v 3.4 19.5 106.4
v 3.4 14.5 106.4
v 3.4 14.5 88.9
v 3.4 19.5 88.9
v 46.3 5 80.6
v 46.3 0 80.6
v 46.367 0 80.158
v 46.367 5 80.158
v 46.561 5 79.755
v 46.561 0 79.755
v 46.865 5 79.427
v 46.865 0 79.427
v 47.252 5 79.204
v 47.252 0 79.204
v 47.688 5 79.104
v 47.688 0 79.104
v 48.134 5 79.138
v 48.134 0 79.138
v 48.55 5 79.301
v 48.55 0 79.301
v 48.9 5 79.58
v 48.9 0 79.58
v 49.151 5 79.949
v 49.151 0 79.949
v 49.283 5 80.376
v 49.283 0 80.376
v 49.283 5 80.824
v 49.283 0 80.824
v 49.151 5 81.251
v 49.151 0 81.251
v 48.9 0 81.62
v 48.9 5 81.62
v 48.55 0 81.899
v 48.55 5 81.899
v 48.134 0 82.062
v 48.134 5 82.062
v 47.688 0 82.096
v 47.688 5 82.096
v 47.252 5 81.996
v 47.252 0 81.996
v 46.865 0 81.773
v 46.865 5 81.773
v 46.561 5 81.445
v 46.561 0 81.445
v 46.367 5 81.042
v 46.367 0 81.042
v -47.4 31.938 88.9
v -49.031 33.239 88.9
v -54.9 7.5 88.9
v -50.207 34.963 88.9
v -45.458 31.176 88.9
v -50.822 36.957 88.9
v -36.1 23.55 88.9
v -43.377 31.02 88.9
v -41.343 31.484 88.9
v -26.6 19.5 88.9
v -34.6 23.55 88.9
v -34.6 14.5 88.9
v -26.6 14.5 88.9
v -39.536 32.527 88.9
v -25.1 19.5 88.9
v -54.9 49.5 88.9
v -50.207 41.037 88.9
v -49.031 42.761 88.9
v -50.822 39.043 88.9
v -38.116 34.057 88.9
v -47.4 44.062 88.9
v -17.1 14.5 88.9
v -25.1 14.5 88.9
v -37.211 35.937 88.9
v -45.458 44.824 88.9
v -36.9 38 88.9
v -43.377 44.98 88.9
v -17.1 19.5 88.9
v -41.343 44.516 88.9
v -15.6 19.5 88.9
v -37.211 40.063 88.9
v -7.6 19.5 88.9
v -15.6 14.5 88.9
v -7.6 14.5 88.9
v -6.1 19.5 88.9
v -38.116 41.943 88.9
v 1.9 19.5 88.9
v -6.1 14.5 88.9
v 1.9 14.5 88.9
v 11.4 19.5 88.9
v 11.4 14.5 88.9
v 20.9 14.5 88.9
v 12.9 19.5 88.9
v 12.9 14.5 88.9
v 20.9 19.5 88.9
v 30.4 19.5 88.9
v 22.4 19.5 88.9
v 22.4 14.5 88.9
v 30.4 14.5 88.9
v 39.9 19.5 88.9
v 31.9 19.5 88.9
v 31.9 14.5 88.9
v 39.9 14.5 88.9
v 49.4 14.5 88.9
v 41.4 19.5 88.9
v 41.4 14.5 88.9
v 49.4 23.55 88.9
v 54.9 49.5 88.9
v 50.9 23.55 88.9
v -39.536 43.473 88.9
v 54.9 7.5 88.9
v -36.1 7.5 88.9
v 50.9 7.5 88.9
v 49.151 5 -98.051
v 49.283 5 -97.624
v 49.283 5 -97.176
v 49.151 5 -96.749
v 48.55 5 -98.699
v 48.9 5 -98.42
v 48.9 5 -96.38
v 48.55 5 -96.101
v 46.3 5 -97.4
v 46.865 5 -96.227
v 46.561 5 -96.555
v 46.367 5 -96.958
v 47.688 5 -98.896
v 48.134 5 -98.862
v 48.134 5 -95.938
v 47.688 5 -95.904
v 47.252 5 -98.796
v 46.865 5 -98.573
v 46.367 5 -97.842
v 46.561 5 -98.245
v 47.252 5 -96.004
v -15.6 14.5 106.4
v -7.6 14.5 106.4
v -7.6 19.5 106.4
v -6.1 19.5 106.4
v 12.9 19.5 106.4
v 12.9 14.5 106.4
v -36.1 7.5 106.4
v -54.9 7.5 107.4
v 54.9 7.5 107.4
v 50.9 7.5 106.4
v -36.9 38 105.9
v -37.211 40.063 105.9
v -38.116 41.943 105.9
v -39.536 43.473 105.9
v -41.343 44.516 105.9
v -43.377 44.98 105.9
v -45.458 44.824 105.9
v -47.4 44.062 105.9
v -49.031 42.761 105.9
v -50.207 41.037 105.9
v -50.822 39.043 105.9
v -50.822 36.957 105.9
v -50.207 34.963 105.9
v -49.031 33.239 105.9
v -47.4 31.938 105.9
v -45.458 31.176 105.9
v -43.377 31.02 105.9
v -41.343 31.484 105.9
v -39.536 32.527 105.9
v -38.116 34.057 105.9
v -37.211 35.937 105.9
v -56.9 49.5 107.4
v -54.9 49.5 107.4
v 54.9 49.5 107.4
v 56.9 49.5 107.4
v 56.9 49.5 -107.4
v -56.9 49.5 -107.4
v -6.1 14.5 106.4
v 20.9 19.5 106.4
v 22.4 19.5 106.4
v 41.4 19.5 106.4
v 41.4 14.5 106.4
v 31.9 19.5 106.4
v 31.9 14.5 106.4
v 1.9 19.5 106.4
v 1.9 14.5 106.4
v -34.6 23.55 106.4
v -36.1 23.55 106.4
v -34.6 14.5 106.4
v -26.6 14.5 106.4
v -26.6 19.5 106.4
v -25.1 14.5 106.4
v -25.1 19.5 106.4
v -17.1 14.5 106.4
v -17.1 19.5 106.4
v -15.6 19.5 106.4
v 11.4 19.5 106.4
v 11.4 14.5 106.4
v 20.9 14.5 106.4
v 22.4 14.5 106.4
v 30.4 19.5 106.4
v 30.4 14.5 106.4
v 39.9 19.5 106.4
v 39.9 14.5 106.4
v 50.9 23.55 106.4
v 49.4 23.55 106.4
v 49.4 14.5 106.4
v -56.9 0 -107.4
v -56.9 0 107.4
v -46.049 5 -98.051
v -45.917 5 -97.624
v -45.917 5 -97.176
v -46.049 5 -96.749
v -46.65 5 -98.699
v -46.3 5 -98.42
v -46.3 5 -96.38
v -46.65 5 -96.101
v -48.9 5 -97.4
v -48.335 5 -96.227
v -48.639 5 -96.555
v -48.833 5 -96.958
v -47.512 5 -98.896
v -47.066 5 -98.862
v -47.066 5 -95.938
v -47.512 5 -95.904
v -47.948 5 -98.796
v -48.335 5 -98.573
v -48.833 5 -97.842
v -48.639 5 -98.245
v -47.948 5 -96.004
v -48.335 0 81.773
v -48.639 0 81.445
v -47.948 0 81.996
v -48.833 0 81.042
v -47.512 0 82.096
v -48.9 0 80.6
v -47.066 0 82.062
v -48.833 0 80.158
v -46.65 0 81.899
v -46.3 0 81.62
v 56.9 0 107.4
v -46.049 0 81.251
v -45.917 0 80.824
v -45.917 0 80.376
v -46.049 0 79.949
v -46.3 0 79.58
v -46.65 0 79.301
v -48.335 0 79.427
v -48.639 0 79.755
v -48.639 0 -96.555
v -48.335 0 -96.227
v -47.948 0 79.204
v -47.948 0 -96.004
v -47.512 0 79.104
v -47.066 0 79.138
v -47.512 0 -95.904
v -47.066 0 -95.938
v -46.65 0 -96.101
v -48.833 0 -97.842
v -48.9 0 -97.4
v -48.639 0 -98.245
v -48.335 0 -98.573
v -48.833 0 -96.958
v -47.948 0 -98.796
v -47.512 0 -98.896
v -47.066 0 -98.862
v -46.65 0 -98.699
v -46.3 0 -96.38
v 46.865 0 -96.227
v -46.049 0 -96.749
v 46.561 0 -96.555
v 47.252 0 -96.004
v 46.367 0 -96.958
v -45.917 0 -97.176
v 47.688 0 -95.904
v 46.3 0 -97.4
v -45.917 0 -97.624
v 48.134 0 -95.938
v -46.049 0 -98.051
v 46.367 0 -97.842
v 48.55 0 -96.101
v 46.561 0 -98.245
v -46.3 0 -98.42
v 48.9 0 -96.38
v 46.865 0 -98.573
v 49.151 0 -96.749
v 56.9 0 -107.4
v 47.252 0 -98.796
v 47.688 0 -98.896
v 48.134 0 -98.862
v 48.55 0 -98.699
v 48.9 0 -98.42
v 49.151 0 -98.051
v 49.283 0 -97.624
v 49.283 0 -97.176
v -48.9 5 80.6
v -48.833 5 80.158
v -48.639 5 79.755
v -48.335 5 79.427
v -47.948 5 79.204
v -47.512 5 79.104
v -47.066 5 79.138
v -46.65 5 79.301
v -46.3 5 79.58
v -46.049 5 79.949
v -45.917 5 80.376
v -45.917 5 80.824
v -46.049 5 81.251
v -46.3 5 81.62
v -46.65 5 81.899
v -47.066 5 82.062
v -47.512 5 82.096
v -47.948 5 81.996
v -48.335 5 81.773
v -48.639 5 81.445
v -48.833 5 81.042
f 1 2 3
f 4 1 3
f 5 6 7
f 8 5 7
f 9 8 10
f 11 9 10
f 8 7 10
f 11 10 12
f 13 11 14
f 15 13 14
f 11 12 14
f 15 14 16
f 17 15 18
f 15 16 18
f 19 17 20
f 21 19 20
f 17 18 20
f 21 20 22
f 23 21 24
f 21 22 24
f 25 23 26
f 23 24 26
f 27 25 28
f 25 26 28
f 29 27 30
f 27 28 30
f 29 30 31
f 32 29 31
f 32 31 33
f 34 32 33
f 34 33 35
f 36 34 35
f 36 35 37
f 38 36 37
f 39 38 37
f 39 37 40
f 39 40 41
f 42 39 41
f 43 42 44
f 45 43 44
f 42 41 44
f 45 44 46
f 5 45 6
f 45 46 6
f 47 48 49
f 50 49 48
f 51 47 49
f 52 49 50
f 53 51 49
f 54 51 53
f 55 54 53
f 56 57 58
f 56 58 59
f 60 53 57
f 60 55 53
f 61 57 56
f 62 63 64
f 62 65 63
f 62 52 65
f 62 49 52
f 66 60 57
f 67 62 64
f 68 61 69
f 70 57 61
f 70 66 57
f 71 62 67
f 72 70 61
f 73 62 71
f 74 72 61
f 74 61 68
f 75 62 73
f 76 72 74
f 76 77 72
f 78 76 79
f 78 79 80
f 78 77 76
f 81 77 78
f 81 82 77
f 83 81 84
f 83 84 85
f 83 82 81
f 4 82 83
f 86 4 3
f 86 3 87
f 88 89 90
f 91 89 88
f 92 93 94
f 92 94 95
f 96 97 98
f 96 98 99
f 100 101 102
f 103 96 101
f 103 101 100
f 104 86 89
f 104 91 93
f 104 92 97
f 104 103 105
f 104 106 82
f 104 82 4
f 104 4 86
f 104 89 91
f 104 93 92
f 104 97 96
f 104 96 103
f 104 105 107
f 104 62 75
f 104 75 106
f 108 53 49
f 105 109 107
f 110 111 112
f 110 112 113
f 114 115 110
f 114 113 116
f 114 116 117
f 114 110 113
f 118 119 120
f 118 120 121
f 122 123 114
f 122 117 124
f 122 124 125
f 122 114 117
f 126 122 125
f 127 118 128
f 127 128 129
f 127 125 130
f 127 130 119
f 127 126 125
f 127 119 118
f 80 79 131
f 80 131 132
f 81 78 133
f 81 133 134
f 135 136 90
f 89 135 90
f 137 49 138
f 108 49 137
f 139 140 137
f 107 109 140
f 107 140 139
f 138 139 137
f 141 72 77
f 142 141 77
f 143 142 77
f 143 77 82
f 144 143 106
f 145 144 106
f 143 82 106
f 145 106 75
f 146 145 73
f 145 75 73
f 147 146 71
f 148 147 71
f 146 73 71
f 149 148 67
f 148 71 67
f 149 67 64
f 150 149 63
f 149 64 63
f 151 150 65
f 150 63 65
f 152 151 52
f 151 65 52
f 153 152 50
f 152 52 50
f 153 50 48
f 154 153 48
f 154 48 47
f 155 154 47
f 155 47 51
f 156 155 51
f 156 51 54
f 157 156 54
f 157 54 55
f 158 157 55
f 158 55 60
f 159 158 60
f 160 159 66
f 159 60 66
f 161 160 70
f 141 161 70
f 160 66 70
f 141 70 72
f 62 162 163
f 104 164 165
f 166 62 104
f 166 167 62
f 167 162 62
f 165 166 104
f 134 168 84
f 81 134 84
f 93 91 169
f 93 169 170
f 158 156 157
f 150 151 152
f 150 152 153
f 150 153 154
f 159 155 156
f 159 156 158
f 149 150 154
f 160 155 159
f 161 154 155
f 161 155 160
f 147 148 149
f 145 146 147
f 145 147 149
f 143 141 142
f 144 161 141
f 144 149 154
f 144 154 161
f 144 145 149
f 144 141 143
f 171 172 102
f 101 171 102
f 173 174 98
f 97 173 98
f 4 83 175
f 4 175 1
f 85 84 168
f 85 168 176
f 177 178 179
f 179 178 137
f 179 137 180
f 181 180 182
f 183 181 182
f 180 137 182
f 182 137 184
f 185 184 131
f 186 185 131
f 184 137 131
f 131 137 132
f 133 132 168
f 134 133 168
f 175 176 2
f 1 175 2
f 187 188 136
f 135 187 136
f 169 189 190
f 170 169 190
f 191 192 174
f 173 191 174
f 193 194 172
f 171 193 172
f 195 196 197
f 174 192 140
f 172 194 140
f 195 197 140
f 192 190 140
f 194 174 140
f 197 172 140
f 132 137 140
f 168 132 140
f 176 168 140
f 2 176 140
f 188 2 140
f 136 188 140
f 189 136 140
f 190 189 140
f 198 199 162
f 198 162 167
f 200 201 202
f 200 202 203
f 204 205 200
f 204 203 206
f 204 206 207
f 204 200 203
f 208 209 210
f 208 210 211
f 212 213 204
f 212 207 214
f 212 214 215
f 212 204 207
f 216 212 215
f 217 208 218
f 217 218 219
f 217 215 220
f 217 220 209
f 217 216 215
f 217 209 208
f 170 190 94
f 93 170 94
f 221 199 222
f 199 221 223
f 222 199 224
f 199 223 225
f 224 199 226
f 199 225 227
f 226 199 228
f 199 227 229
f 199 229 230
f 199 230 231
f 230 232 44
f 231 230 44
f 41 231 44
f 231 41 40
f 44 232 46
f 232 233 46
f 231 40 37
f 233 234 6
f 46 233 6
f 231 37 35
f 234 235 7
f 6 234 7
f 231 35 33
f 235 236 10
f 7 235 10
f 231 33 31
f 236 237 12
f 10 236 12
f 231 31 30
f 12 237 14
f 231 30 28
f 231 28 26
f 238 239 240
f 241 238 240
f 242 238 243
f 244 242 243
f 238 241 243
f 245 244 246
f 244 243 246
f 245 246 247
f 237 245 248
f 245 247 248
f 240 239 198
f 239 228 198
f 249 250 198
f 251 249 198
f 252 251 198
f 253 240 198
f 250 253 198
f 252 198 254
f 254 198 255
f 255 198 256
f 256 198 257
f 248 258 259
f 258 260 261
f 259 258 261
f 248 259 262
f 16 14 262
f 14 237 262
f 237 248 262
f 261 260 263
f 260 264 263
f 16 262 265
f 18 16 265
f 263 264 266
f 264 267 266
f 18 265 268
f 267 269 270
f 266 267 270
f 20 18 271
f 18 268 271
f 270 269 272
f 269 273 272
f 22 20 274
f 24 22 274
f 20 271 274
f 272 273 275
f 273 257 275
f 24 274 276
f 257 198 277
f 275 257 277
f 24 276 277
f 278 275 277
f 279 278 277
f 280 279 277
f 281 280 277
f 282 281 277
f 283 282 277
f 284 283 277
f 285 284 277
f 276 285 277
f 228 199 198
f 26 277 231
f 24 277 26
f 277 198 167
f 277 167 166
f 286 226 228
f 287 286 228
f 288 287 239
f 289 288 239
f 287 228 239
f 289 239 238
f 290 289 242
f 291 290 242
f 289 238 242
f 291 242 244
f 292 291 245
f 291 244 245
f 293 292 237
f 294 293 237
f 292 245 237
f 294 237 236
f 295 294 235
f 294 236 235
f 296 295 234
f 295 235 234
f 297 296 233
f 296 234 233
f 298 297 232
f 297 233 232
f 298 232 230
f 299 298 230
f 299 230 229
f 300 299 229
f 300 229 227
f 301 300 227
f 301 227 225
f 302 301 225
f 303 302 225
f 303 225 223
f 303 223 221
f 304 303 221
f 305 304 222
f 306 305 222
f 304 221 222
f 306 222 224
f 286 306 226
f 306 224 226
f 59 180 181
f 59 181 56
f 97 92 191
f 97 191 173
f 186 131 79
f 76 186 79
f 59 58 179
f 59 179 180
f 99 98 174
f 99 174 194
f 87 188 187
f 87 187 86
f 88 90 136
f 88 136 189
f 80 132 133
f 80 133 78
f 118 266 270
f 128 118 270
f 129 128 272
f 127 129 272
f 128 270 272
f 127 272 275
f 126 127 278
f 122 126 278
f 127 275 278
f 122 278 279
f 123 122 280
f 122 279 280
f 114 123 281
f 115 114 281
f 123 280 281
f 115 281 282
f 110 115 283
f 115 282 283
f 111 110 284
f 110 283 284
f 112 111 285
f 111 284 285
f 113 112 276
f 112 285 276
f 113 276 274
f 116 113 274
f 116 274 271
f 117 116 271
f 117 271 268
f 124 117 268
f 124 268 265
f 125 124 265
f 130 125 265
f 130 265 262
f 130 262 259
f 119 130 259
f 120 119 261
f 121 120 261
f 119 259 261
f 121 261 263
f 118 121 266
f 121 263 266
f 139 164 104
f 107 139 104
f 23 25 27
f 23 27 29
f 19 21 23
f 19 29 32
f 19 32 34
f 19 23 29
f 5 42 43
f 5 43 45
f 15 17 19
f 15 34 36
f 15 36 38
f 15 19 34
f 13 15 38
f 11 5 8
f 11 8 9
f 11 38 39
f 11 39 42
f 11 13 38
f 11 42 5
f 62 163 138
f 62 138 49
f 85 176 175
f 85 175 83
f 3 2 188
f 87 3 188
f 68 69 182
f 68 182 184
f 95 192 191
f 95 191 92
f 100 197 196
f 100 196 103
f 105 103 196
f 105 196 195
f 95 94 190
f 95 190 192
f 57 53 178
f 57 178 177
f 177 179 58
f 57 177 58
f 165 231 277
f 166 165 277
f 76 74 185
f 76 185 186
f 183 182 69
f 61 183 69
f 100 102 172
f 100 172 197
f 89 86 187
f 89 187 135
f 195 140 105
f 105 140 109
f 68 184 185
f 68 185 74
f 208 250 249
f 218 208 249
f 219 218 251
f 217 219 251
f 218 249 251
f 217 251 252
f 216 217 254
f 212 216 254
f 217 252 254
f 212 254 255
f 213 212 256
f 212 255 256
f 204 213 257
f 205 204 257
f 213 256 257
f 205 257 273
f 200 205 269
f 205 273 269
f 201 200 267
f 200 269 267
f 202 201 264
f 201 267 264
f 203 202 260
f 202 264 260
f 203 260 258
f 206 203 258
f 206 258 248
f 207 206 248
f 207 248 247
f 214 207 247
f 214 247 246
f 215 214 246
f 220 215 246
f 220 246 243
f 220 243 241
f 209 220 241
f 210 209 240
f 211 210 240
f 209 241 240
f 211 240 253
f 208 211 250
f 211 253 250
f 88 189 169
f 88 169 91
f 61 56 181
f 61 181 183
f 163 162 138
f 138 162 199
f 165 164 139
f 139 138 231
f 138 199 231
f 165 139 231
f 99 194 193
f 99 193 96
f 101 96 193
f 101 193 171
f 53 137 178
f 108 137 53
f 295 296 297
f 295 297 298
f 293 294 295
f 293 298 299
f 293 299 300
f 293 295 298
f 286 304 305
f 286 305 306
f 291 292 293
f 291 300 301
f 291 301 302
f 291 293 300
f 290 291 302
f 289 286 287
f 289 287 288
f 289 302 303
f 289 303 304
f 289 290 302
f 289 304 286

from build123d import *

# Parameters (mm, degrees)
SKETCH1_W           = 113.8
SKETCH1_H           = 214.8
BOSS_EXTRUDE1_DEPTH = 49.5
SKETCH2_W           = 109.8
SKETCH2_H           = 18.5
CUT_EXTRUDE1_DEPTH  = 42
SKETCH3_W           = 87
SKETCH3_H           = 17.5
BOSS_EXTRUDE2_DEPTH = 7
SKETCH4_W           = 1.5
SKETCH4_H           = 17.5
BOSS_EXTRUDE3_DEPTH = 9.05
SKETCH4_3_W         = 1.5
SKETCH4_3_H         = 17.5
BOSS_EXTRUDE4_DEPTH = 5
SKETCH5_R           = 7
BOSS_EXTRUDE5_DEPTH = 17
SKETCH6_R           = 1.5
CUT_EXTRUDE2_DEPTH  = 5


with BuildPart() as part:
    # Sketch1 → Boss-Extrude1 (new body)
    with BuildSketch(Plane(origin=(0, 0, 0), x_dir=(1, 0, 0), z_dir=(0, 1, 0))):
        Rectangle(SKETCH1_W, SKETCH1_H)
    extrude(amount=BOSS_EXTRUDE1_DEPTH)

    # Sketch2 → Cut-Extrude1 (cut)
    with BuildSketch(Plane(origin=(0, 49.5, 0), x_dir=(1, 0, 0), z_dir=(0, 1, 0))):
        with Locations((0, -98.15)):
            Rectangle(SKETCH2_W, SKETCH2_H)
    extrude(amount=-CUT_EXTRUDE1_DEPTH, mode=Mode.SUBTRACT)

    # Sketch3 → Boss-Extrude2 (add)
    with BuildSketch(Plane(origin=(0, 7.5, 0), x_dir=(1, 0, 0), z_dir=(0, 1, 0))):
        with Locations((7.4, -97.65)):
            Rectangle(SKETCH3_W, SKETCH3_H)
    extrude(amount=BOSS_EXTRUDE2_DEPTH)

    # Sketch4 → Boss-Extrude3 (add)
    with BuildSketch(Plane(origin=(0, 14.5, 0), x_dir=(1, 0, 0), z_dir=(0, 1, 0))):
        with Locations((-35.35, -97.65)):
            Rectangle(SKETCH4_W, SKETCH4_H)
        with Locations((50.15, -97.65)):
            Rectangle(SKETCH4_W, SKETCH4_H)
    extrude(amount=BOSS_EXTRUDE3_DEPTH)

    # Sketch4<3> → Boss-Extrude4 (add)
    with BuildSketch(Plane(origin=(0, 14.5, 0), x_dir=(1, 0, 0), z_dir=(0, 1, 0))):
        with Locations((-25.85, -97.65)):
            Rectangle(SKETCH4_3_W, SKETCH4_3_H)
        with Locations((-16.35, -97.65)):
            Rectangle(SKETCH4_3_W, SKETCH4_3_H)
        with Locations((-6.85, -97.65)):
            Rectangle(SKETCH4_3_W, SKETCH4_3_H)
        with Locations((2.65, -97.65)):
            Rectangle(SKETCH4_3_W, SKETCH4_3_H)
        with Locations((12.15, -97.65)):
            Rectangle(SKETCH4_3_W, SKETCH4_3_H)
        with Locations((21.65, -97.65)):
            Rectangle(SKETCH4_3_W, SKETCH4_3_H)
        with Locations((31.15, -97.65)):
            Rectangle(SKETCH4_3_W, SKETCH4_3_H)
        with Locations((40.65, -97.65)):
            Rectangle(SKETCH4_3_W, SKETCH4_3_H)
    extrude(amount=BOSS_EXTRUDE4_DEPTH)

    # Sketch5 → Boss-Extrude5 (add)
    with BuildSketch(Plane.XY.offset(88.9)):
        with Locations((-43.9, 38)):
            Circle(SKETCH5_R)
    extrude(amount=BOSS_EXTRUDE5_DEPTH)

    # Sketch6 → Cut-Extrude2 (cut)
    with BuildSketch(Plane(origin=(0, 0, 0), x_dir=(-1, 0, 0), z_dir=(0, -1, 0))):
        with Locations((-47.8, -80.6)):
            Circle(SKETCH6_R)
        with Locations((-47.8, 97.4)):
            Circle(SKETCH6_R)
        with Locations((47.4, 97.4)):
            Circle(SKETCH6_R)
        with Locations((47.4, -80.6)):
            Circle(SKETCH6_R)
    extrude(amount=-CUT_EXTRUDE2_DEPTH, mode=Mode.SUBTRACT)


solid = part.part
